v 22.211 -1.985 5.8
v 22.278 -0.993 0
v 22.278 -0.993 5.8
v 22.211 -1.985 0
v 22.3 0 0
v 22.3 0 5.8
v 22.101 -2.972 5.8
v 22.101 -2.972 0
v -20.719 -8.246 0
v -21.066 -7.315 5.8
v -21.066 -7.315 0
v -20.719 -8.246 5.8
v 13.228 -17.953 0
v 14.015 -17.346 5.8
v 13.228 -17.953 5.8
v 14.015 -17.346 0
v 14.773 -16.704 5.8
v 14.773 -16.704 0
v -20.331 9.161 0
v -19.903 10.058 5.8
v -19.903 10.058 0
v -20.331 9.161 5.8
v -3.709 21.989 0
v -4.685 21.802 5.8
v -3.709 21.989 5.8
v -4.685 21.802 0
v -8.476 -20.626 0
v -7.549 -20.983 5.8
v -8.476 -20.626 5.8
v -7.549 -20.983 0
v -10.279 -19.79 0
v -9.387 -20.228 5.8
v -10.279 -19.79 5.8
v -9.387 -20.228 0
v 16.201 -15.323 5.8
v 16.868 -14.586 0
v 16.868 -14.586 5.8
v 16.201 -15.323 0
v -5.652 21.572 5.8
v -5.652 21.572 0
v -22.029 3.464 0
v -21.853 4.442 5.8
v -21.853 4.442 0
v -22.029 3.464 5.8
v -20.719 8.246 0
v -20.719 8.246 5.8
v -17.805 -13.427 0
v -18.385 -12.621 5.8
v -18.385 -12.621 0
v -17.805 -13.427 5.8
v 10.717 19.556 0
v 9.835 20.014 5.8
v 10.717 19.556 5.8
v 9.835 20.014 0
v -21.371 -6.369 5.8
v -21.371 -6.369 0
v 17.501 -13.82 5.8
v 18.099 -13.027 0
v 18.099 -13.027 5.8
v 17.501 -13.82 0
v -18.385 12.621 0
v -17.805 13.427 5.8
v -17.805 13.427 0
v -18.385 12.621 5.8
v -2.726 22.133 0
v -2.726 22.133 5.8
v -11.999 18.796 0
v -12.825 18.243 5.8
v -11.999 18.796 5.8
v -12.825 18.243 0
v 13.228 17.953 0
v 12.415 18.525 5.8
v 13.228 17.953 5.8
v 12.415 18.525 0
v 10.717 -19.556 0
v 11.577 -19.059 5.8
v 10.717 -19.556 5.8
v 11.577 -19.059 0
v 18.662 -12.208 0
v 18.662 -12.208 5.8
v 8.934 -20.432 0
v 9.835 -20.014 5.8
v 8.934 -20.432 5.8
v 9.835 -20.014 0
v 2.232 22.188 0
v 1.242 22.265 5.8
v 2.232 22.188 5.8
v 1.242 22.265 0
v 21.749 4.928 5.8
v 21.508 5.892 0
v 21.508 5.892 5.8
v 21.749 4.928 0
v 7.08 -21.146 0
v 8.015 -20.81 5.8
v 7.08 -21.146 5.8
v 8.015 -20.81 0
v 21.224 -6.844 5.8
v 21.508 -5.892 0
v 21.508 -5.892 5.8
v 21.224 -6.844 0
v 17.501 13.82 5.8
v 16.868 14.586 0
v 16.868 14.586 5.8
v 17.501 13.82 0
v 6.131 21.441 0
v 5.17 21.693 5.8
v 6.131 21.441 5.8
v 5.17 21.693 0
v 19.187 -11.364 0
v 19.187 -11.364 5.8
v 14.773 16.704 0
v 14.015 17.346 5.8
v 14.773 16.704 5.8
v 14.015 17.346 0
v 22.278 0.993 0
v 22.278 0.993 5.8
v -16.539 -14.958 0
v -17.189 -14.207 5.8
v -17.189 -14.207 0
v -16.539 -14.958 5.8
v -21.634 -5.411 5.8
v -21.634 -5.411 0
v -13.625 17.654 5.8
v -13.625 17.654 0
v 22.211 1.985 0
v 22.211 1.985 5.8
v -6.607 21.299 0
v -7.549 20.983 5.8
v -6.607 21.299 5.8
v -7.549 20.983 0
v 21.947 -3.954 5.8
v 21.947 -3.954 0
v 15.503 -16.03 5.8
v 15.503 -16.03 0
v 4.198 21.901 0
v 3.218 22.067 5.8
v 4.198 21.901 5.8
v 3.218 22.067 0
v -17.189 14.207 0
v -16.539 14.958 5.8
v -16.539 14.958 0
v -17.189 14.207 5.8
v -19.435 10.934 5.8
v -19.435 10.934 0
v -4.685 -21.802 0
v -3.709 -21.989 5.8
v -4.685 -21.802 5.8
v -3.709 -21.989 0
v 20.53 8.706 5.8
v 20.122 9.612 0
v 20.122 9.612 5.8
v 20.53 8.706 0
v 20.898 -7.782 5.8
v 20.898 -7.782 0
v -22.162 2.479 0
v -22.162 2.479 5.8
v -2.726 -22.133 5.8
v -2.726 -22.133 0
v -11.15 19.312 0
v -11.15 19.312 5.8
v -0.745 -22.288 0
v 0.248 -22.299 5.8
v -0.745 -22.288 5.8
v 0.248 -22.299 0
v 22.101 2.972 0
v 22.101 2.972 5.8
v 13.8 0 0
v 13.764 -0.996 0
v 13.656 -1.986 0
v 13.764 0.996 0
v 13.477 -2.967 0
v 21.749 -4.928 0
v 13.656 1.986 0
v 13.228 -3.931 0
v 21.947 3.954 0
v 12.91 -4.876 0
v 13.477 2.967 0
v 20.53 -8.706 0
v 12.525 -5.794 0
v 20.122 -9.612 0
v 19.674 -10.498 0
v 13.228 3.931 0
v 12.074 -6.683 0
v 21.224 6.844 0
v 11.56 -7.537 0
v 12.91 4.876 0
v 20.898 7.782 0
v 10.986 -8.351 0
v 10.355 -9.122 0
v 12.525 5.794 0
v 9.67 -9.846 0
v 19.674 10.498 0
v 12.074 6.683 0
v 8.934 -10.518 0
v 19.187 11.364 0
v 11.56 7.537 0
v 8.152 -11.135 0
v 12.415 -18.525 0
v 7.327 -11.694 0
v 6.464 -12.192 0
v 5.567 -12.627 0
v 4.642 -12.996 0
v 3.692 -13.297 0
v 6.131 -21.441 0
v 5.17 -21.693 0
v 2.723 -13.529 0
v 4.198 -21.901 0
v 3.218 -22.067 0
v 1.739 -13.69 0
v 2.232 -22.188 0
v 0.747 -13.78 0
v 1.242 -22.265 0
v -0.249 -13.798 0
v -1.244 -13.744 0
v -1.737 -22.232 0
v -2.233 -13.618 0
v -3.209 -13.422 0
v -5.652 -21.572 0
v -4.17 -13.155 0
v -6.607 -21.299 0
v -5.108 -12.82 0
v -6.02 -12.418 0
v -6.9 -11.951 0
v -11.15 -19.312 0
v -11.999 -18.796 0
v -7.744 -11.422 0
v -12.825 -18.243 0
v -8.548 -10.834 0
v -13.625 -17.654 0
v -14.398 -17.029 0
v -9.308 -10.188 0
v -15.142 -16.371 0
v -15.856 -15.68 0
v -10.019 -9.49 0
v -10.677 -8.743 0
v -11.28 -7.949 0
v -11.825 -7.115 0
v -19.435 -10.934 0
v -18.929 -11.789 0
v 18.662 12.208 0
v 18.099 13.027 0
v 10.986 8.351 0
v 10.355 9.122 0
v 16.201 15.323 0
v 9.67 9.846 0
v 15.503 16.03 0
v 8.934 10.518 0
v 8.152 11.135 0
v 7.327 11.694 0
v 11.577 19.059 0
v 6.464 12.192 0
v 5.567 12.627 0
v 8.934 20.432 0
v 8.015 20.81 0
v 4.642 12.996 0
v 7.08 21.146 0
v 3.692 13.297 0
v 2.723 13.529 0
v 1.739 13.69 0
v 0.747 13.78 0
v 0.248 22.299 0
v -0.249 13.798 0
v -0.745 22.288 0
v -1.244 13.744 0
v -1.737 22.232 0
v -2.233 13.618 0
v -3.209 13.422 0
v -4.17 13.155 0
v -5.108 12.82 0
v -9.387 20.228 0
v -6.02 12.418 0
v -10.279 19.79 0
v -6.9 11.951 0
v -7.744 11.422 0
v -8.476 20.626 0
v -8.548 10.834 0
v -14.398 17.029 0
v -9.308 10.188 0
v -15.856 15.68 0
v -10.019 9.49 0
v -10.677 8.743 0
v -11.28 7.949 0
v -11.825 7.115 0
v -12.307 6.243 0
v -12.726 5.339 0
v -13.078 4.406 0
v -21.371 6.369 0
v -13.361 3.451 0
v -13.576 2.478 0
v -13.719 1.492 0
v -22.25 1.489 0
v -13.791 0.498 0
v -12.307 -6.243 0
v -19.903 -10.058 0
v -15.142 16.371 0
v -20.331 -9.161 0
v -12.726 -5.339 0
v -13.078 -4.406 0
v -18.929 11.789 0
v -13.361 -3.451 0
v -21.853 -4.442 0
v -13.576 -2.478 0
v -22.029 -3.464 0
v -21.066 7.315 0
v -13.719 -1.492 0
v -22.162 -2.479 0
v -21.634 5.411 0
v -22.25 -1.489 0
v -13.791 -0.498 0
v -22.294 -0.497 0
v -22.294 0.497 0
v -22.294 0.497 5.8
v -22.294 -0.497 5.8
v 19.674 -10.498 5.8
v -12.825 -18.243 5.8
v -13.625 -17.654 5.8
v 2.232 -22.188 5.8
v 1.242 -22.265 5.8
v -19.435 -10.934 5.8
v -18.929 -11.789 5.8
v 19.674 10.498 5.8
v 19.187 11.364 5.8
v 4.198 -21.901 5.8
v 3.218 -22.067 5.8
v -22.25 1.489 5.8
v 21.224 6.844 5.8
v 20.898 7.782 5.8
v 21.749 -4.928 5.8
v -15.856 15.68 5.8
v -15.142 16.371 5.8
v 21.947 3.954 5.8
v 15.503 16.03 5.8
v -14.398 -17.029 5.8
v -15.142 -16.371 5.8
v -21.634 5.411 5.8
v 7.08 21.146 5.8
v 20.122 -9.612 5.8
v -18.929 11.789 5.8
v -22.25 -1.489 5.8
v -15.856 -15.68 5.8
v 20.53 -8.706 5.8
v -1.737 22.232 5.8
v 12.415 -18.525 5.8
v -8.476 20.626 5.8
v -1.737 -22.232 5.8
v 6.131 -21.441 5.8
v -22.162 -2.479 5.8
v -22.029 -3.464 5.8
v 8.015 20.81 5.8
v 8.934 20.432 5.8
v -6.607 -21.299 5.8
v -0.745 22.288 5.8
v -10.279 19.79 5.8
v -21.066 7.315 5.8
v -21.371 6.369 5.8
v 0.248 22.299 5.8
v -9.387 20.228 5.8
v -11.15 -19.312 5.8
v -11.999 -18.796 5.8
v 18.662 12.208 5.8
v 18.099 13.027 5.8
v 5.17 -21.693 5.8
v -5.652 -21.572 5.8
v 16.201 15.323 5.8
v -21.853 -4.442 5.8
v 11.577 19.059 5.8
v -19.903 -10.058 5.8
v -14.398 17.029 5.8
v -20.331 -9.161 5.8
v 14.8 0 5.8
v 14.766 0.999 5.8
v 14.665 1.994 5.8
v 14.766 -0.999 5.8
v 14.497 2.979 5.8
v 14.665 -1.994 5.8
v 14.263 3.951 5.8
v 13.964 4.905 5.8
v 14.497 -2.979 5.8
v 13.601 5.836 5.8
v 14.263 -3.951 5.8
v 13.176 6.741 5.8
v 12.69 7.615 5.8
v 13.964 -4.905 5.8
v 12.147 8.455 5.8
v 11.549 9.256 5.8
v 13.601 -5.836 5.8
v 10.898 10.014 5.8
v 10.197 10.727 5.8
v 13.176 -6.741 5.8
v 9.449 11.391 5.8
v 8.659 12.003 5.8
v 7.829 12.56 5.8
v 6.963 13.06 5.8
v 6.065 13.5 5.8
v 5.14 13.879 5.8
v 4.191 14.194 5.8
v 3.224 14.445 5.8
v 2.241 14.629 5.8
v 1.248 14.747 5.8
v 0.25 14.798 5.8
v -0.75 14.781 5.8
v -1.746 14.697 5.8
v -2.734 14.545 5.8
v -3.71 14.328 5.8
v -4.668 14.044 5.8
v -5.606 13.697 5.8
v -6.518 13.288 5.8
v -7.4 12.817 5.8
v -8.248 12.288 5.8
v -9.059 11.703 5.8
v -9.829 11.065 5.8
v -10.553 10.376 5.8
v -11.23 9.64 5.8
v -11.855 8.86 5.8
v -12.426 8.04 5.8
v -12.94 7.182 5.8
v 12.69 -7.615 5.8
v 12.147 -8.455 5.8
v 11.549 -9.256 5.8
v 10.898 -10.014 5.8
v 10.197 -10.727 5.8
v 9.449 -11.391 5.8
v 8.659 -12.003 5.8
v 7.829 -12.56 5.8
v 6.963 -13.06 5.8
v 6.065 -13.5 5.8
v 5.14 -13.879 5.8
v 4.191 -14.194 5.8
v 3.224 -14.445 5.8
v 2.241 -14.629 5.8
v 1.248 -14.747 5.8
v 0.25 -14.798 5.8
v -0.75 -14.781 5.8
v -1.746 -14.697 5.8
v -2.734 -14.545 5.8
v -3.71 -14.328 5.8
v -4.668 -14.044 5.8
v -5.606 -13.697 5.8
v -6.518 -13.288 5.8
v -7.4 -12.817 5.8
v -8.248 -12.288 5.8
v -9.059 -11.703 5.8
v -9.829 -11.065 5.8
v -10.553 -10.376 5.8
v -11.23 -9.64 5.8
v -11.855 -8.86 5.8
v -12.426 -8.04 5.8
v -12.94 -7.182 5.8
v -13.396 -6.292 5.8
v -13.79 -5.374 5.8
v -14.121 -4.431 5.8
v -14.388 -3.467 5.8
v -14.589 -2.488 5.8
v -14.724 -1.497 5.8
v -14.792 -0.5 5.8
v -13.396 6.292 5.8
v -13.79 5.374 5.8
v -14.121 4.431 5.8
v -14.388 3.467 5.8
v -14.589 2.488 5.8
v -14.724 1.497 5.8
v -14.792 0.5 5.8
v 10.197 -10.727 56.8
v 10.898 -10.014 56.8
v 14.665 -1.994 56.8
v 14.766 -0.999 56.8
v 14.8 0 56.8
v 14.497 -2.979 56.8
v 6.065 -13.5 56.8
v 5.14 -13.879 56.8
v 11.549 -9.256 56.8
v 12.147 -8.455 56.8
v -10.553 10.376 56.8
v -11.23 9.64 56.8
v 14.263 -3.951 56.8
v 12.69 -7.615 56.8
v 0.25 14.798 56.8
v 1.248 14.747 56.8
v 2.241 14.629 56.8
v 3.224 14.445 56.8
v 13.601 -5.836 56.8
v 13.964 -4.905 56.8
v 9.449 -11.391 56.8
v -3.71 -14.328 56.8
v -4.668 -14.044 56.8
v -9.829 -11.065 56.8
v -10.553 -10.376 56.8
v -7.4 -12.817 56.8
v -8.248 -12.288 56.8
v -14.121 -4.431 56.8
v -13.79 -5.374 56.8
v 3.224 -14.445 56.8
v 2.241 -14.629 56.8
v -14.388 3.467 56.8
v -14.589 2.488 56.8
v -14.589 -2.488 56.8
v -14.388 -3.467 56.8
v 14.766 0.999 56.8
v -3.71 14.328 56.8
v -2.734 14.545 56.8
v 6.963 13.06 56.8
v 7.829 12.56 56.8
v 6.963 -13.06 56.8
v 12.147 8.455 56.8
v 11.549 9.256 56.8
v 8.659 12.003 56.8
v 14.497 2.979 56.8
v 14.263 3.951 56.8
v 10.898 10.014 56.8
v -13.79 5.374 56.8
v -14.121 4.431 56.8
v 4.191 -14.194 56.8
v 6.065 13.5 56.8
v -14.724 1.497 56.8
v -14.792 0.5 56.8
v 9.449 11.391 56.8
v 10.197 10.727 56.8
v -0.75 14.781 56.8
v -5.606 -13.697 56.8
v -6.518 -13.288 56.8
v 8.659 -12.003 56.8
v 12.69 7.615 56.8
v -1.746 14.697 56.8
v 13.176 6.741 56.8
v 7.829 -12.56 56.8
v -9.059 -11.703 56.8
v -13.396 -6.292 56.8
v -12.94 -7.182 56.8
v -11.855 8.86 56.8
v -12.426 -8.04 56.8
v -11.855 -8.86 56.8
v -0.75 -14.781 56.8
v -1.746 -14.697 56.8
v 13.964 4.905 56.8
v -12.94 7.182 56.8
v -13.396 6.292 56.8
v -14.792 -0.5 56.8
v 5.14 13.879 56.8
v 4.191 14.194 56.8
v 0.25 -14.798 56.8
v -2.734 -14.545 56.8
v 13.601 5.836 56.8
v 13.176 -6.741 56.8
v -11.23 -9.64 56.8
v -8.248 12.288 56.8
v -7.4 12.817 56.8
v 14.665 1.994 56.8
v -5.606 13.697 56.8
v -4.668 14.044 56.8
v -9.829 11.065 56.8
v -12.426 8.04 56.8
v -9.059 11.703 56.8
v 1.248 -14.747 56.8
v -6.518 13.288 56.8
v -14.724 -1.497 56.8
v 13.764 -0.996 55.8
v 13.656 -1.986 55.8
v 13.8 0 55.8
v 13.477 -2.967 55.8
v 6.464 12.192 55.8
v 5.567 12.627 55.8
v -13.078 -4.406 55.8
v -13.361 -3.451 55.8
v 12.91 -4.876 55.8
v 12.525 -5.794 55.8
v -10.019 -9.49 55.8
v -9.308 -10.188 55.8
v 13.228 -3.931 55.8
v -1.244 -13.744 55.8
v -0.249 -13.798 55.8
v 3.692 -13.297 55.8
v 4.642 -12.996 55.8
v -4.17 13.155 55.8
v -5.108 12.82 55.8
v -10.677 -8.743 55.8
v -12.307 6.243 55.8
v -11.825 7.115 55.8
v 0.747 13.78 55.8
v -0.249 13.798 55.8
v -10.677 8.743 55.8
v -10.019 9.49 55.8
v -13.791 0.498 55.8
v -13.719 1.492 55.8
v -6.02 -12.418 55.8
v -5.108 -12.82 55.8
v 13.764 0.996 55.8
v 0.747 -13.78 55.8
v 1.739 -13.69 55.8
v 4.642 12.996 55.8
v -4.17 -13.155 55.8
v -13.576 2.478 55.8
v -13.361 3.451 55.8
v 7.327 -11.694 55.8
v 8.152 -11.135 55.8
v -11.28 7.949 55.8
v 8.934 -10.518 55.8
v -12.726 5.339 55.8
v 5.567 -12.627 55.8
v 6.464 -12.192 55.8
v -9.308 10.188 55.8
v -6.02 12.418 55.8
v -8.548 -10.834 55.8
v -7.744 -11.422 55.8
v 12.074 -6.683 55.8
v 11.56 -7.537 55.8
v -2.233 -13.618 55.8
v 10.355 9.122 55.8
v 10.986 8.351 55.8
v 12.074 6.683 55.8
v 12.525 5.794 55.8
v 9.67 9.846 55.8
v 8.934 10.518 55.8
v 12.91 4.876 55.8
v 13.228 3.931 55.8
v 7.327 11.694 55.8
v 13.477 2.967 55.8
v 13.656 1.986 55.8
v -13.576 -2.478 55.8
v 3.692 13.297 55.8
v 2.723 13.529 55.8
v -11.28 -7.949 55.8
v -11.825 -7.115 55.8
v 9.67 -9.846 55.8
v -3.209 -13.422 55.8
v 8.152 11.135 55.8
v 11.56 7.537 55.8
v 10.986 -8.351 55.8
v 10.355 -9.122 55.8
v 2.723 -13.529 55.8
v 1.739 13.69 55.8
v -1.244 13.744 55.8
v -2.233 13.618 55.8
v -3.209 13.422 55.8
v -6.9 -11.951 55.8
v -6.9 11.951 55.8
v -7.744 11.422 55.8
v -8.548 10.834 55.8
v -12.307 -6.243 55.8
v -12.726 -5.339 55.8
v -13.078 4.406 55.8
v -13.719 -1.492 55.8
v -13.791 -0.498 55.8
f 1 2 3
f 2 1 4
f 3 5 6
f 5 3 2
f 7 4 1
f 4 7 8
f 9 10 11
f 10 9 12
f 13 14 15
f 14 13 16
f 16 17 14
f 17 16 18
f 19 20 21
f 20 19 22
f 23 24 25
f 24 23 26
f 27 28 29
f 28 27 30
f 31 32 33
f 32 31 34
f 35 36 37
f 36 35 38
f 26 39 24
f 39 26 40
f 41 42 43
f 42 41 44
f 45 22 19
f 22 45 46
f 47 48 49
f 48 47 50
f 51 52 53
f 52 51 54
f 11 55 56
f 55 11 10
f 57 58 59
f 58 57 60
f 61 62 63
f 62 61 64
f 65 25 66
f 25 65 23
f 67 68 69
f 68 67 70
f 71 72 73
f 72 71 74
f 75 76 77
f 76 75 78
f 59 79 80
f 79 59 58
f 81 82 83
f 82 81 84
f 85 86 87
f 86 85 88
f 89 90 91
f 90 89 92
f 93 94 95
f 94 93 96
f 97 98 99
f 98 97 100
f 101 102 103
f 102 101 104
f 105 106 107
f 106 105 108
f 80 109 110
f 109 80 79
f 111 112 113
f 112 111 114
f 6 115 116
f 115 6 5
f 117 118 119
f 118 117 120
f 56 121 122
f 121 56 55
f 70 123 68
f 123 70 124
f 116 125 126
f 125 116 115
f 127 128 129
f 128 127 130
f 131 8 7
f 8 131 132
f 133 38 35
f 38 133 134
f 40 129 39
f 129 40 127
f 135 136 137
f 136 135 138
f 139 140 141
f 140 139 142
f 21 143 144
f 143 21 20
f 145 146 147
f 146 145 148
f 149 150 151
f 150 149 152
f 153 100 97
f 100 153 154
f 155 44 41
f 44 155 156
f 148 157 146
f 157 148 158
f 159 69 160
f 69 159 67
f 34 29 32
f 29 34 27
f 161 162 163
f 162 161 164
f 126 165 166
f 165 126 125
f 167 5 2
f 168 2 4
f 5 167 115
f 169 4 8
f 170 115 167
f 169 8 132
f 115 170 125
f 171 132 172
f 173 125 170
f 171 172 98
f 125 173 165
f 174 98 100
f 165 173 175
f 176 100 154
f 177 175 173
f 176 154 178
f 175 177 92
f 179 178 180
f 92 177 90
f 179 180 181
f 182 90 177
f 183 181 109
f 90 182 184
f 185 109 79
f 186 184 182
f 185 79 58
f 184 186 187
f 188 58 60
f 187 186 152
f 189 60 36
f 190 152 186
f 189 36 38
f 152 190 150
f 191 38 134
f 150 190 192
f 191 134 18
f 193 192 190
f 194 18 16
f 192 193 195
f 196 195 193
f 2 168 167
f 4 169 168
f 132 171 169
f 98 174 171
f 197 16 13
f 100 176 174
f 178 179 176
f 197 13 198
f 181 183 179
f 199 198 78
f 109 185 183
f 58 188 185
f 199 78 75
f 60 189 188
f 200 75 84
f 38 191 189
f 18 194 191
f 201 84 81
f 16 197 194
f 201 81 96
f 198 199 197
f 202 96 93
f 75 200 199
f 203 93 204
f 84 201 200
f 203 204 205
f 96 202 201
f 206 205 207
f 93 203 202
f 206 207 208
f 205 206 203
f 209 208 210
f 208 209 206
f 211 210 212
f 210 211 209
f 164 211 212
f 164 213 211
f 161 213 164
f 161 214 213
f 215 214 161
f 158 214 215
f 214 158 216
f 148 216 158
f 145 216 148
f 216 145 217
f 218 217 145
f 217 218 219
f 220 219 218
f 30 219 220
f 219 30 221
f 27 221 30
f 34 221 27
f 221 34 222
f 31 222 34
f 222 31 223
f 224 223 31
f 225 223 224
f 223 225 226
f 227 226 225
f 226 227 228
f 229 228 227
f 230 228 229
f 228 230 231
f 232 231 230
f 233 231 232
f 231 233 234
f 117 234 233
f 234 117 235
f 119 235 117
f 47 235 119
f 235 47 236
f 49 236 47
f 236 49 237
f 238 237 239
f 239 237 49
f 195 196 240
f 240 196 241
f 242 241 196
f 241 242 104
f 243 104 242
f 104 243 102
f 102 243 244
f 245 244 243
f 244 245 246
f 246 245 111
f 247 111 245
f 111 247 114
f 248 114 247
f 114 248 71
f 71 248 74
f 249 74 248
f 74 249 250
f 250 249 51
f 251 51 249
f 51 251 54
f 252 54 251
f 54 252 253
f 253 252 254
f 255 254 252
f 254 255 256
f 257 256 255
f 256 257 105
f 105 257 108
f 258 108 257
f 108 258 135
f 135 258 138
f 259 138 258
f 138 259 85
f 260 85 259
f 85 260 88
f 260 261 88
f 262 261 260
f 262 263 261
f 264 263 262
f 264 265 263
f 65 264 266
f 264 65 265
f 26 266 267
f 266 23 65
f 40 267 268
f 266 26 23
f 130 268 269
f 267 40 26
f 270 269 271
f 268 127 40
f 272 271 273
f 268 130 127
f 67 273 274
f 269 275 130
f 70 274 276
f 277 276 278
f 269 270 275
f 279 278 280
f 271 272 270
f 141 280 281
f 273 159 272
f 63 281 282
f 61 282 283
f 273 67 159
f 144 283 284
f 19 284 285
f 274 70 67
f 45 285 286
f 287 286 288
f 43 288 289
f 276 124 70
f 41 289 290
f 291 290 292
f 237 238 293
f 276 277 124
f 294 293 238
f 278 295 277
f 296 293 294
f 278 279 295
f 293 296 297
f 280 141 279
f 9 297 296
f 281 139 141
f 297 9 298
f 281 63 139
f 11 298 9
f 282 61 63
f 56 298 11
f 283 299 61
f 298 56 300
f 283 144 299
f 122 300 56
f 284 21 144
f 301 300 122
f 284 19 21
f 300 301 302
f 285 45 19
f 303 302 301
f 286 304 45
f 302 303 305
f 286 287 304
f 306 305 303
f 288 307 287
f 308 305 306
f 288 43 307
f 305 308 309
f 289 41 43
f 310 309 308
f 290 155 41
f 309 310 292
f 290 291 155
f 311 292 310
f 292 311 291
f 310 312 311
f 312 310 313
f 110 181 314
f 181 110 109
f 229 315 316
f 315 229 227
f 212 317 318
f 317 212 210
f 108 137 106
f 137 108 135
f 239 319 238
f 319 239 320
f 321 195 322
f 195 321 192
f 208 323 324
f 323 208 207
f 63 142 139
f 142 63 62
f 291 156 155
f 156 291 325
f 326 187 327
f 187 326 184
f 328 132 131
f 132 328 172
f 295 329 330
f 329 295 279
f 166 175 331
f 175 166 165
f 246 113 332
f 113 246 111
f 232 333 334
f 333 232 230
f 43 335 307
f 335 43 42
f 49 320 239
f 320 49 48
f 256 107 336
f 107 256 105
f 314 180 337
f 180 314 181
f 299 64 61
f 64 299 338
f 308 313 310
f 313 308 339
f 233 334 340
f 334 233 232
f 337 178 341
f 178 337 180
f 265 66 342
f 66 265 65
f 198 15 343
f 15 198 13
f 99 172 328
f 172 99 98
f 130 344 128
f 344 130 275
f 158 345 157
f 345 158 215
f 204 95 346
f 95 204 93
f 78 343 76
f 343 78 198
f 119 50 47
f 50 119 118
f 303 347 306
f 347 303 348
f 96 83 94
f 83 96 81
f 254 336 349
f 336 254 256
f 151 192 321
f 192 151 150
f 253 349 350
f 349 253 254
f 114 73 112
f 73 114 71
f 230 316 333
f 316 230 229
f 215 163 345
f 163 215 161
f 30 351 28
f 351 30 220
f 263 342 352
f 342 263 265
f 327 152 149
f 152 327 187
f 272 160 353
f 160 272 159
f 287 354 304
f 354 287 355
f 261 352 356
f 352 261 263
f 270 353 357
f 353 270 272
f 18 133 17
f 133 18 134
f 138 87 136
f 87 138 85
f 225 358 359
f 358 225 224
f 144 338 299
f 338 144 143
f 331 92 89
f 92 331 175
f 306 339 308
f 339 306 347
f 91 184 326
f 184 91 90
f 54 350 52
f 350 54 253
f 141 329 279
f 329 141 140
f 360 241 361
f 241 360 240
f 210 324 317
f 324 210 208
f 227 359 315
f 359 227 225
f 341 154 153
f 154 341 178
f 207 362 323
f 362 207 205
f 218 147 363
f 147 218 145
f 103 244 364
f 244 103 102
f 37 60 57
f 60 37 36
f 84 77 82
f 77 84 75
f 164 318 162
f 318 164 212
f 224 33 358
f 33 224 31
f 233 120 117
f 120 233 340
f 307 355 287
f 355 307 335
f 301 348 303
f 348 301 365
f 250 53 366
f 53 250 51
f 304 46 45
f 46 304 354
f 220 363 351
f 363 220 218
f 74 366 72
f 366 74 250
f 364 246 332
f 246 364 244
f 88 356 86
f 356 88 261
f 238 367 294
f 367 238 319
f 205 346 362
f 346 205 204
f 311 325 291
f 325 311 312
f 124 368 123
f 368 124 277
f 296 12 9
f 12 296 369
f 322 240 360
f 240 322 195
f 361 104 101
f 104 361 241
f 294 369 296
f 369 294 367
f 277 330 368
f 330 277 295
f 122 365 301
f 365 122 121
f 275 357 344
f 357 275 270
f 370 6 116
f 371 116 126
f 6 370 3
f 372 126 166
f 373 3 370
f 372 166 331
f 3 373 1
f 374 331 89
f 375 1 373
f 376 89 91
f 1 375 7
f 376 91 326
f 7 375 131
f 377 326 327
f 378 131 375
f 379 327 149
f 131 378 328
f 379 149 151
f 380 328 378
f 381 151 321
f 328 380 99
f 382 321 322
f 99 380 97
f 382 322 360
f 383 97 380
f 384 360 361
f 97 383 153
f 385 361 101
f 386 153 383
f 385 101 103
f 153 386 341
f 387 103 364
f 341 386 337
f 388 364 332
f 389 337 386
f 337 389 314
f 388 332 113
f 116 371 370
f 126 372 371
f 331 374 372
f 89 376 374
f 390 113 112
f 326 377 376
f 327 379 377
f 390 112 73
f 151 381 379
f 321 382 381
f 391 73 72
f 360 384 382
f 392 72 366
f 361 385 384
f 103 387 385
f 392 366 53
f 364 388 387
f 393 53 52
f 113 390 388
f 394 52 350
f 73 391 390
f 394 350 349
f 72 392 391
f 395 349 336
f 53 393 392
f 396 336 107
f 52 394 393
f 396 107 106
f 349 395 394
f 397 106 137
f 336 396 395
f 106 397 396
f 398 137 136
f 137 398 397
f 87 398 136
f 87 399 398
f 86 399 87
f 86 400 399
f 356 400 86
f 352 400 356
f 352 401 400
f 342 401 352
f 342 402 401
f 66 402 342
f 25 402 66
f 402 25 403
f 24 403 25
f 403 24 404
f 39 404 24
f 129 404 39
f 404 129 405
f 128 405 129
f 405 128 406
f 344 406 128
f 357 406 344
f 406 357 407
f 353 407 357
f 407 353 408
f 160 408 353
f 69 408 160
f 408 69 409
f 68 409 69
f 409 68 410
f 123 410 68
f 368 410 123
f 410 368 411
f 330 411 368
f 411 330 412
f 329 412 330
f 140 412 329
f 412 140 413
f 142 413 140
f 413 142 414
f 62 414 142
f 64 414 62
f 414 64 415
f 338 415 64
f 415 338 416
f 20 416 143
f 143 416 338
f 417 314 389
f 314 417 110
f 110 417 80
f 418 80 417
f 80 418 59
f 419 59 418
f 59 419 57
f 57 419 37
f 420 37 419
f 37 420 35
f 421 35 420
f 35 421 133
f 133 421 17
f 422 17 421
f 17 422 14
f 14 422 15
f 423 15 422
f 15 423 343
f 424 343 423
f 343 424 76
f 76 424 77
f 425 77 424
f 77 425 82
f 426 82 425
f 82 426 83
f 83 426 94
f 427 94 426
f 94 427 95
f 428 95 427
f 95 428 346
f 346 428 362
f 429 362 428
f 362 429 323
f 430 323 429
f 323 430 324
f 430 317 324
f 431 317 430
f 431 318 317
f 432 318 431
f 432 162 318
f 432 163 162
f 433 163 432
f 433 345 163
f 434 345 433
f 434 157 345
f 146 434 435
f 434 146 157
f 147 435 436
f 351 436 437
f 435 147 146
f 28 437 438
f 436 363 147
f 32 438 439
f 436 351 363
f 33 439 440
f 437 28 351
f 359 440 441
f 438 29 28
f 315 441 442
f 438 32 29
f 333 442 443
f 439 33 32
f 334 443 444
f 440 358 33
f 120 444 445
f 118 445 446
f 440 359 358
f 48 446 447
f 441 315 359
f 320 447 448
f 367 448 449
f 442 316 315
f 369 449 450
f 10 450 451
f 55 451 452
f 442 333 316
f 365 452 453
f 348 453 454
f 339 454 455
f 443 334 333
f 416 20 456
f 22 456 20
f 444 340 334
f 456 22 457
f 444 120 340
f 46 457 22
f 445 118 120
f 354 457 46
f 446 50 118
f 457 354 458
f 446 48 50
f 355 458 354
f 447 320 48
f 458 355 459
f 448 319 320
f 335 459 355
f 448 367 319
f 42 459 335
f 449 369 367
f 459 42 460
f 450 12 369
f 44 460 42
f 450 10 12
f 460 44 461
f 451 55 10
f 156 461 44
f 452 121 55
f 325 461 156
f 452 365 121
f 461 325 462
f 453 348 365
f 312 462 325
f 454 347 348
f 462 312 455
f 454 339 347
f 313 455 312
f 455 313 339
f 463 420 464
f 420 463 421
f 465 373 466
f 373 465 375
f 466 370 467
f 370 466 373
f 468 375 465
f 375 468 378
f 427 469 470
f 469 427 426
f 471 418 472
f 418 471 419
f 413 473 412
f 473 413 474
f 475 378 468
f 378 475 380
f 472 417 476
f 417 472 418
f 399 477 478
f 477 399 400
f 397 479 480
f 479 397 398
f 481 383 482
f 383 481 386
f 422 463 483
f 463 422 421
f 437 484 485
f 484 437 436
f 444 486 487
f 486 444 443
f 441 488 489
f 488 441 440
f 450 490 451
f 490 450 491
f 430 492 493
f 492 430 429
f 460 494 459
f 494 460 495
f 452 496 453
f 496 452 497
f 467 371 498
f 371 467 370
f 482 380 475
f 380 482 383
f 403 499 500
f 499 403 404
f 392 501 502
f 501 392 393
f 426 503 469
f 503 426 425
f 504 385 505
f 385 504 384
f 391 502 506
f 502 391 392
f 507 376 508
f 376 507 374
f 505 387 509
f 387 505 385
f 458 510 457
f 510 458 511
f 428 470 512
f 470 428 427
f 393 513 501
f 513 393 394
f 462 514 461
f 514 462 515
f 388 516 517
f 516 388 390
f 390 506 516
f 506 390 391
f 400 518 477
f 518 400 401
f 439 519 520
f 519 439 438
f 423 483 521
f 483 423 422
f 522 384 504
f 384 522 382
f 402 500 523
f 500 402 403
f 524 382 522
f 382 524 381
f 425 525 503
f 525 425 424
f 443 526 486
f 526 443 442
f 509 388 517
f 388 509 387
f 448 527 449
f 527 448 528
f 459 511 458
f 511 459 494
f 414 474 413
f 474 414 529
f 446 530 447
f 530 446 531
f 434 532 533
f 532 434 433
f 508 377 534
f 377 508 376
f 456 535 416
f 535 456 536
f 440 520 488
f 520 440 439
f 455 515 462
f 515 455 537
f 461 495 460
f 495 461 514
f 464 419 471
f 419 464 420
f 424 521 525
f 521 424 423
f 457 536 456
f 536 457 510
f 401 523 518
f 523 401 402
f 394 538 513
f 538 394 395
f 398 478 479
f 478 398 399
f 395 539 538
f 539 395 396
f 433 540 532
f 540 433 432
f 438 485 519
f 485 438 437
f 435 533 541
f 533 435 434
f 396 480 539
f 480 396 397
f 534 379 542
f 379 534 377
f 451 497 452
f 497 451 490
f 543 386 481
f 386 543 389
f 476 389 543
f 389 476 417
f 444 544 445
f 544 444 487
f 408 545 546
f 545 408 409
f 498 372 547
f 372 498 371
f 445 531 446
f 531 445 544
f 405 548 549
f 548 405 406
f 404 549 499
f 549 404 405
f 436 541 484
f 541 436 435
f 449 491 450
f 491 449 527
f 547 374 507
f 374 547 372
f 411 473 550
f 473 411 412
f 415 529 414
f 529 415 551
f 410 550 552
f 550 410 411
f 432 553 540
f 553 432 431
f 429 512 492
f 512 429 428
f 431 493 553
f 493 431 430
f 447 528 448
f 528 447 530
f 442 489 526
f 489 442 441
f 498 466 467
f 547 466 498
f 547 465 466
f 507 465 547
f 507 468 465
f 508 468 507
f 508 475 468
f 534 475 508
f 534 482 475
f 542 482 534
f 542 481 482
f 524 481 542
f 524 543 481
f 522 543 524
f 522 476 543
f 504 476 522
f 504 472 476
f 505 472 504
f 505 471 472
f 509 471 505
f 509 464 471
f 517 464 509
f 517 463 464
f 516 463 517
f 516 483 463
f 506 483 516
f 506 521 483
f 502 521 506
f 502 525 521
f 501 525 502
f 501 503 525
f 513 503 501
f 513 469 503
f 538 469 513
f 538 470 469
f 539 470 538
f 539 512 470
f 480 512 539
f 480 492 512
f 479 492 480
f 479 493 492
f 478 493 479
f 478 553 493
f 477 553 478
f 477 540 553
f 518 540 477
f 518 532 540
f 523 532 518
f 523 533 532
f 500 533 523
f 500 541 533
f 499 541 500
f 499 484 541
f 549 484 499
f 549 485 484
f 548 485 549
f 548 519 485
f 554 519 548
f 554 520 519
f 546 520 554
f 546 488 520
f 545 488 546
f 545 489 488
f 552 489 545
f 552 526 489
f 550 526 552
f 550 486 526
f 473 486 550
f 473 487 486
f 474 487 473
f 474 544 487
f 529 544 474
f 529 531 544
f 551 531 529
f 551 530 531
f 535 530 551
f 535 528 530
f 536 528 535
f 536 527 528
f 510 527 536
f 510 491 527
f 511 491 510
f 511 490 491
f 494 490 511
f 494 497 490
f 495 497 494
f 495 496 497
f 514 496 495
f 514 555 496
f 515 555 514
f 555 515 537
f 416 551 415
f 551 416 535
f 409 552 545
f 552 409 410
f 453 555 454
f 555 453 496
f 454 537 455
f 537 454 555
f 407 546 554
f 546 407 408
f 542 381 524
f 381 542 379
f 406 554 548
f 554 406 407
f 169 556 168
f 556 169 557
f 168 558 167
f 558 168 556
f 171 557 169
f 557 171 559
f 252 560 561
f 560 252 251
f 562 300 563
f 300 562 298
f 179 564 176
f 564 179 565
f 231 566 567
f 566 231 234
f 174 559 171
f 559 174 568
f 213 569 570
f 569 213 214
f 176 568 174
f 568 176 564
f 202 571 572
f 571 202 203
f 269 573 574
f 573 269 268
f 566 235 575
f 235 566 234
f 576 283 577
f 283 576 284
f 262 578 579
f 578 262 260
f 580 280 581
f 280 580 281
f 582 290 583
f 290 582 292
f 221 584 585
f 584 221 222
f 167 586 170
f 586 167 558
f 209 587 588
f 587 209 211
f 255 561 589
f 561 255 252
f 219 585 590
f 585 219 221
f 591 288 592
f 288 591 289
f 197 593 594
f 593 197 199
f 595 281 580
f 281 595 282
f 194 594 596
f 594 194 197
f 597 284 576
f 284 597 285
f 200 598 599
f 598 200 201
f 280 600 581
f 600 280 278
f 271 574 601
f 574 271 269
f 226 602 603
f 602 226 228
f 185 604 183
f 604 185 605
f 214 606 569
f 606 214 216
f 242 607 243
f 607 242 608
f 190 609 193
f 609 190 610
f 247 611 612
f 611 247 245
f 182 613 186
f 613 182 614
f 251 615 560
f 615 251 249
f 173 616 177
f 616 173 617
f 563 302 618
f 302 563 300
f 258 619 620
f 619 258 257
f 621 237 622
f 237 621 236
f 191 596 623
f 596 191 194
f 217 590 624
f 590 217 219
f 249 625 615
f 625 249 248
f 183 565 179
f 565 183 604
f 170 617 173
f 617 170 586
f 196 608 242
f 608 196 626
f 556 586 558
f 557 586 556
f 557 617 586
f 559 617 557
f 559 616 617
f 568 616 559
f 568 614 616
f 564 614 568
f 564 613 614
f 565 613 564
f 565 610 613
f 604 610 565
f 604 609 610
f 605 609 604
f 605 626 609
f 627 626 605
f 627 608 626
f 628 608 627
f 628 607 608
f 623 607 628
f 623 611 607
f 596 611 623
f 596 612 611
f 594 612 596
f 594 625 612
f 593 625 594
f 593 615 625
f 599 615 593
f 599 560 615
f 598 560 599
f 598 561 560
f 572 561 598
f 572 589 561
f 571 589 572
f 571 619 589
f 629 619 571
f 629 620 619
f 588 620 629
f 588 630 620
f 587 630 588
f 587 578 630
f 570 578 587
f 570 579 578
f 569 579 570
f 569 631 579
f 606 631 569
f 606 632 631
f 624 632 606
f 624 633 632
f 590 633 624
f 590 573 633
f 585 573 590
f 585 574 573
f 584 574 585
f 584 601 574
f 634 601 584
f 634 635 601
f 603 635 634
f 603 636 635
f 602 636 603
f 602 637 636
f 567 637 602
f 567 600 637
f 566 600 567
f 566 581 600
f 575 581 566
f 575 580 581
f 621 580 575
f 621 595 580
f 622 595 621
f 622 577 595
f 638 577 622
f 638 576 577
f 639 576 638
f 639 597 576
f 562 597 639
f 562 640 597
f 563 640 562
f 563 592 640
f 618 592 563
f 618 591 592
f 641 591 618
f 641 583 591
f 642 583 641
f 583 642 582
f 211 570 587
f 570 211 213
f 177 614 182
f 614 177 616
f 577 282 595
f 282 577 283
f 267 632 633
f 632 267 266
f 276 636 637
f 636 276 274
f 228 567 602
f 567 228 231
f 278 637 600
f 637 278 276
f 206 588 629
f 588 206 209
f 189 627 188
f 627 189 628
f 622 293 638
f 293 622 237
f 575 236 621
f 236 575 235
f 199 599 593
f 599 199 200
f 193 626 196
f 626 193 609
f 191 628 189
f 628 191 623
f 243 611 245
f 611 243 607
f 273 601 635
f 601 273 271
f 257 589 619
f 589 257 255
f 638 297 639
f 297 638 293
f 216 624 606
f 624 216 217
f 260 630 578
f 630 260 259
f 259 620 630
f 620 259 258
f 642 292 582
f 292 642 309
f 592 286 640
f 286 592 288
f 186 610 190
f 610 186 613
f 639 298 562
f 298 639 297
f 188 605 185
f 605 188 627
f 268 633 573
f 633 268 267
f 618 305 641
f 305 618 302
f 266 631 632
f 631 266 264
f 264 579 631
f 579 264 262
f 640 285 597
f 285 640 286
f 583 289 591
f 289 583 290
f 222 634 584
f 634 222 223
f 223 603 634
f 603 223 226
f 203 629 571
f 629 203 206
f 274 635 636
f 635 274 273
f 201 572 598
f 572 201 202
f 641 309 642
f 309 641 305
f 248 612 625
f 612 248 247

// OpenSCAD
// file: pencil_holder.scad
module Pencil_Holder(in_diam=30, out_diam=40, top_lip_height=5, top_bevel_height=0, body_height=100, walls=1, tolerance=0.2, round_bottom=false, upside_down=true, bevelled_inside=false)
{
  // in_diam: diameter of the smaller hole in the desk (outside dimension of the object)
  // out_diam: diameter of the bigger hole on top (outside dimension of the lip)
  // top_height: height of the lip (outside dimension)
  // body_height: inside depth of the pencil holder
  // walls: width of the walls (difference between inside and outside dimension on the main part)
  // tolerance: removed size for places where object needs to fit in hole

  real_top_lip_height = top_lip_height - tolerance;
  real_out_diam = out_diam - tolerance*2;
  real_body_height = body_height + walls;
  real_in_diam = in_diam - tolerance*2;
  hole_diam = real_in_diam - walls*2;

  $fa = 1;
  $fs = 1;
  
  translate([0, 0, upside_down ? real_body_height+real_top_lip_height+top_bevel_height : 0]) rotate([upside_down ? 180 : 0, 0, 0])
  union()
  {
    difference()
    {
      // solid outer part
      union()
      {
        // outer lip
        translate([0, 0, real_body_height+top_bevel_height]) cylinder(h=real_top_lip_height, d=real_out_diam);
        
        if(top_bevel_height > 0)
        {
          // bevel
          translate([0, 0, real_body_height]) cylinder(h=top_bevel_height, d1=real_in_diam, d2=real_out_diam);
        }

        // pencil holder body
        cylinder(h=real_body_height, d=real_in_diam);
      }

      // main hole
      if(round_bottom)
      {
        // completely through hole for round bottom
        translate([0, 0, -walls/2]) cylinder(h=real_body_height+real_top_lip_height+top_bevel_height+walls, d=hole_diam);
      }
      else
      {
        // keep bottom solid
        translate([0, 0, walls]) cylinder(h=real_body_height+real_top_lip_height+top_bevel_height+walls, d=hole_diam);
      }
      
      if(top_bevel_height > 0 && bevelled_inside)
      {
        // bevelled top hole
        translate([0, 0, real_body_height]) cylinder(h=top_bevel_height+real_top_lip_height, d1=hole_diam, d2=real_out_diam-max(walls*2, 5));
      }
    }
    
    if(round_bottom)
    {
      // round bottom
      difference()
      {
        sphere(d=real_in_diam);
        sphere(d=hole_diam);
        translate([0, 0, in_diam/2]) cube(size=in_diam, center=true);
      }
    }
  }
}
// main file
use <pencil_holder.scad>;

// V1 flat lip 40mm deep round bottom
Pencil_Holder(out_diam=45, in_diam=30, top_lip_height=6, body_height=50, round_bottom=false);
